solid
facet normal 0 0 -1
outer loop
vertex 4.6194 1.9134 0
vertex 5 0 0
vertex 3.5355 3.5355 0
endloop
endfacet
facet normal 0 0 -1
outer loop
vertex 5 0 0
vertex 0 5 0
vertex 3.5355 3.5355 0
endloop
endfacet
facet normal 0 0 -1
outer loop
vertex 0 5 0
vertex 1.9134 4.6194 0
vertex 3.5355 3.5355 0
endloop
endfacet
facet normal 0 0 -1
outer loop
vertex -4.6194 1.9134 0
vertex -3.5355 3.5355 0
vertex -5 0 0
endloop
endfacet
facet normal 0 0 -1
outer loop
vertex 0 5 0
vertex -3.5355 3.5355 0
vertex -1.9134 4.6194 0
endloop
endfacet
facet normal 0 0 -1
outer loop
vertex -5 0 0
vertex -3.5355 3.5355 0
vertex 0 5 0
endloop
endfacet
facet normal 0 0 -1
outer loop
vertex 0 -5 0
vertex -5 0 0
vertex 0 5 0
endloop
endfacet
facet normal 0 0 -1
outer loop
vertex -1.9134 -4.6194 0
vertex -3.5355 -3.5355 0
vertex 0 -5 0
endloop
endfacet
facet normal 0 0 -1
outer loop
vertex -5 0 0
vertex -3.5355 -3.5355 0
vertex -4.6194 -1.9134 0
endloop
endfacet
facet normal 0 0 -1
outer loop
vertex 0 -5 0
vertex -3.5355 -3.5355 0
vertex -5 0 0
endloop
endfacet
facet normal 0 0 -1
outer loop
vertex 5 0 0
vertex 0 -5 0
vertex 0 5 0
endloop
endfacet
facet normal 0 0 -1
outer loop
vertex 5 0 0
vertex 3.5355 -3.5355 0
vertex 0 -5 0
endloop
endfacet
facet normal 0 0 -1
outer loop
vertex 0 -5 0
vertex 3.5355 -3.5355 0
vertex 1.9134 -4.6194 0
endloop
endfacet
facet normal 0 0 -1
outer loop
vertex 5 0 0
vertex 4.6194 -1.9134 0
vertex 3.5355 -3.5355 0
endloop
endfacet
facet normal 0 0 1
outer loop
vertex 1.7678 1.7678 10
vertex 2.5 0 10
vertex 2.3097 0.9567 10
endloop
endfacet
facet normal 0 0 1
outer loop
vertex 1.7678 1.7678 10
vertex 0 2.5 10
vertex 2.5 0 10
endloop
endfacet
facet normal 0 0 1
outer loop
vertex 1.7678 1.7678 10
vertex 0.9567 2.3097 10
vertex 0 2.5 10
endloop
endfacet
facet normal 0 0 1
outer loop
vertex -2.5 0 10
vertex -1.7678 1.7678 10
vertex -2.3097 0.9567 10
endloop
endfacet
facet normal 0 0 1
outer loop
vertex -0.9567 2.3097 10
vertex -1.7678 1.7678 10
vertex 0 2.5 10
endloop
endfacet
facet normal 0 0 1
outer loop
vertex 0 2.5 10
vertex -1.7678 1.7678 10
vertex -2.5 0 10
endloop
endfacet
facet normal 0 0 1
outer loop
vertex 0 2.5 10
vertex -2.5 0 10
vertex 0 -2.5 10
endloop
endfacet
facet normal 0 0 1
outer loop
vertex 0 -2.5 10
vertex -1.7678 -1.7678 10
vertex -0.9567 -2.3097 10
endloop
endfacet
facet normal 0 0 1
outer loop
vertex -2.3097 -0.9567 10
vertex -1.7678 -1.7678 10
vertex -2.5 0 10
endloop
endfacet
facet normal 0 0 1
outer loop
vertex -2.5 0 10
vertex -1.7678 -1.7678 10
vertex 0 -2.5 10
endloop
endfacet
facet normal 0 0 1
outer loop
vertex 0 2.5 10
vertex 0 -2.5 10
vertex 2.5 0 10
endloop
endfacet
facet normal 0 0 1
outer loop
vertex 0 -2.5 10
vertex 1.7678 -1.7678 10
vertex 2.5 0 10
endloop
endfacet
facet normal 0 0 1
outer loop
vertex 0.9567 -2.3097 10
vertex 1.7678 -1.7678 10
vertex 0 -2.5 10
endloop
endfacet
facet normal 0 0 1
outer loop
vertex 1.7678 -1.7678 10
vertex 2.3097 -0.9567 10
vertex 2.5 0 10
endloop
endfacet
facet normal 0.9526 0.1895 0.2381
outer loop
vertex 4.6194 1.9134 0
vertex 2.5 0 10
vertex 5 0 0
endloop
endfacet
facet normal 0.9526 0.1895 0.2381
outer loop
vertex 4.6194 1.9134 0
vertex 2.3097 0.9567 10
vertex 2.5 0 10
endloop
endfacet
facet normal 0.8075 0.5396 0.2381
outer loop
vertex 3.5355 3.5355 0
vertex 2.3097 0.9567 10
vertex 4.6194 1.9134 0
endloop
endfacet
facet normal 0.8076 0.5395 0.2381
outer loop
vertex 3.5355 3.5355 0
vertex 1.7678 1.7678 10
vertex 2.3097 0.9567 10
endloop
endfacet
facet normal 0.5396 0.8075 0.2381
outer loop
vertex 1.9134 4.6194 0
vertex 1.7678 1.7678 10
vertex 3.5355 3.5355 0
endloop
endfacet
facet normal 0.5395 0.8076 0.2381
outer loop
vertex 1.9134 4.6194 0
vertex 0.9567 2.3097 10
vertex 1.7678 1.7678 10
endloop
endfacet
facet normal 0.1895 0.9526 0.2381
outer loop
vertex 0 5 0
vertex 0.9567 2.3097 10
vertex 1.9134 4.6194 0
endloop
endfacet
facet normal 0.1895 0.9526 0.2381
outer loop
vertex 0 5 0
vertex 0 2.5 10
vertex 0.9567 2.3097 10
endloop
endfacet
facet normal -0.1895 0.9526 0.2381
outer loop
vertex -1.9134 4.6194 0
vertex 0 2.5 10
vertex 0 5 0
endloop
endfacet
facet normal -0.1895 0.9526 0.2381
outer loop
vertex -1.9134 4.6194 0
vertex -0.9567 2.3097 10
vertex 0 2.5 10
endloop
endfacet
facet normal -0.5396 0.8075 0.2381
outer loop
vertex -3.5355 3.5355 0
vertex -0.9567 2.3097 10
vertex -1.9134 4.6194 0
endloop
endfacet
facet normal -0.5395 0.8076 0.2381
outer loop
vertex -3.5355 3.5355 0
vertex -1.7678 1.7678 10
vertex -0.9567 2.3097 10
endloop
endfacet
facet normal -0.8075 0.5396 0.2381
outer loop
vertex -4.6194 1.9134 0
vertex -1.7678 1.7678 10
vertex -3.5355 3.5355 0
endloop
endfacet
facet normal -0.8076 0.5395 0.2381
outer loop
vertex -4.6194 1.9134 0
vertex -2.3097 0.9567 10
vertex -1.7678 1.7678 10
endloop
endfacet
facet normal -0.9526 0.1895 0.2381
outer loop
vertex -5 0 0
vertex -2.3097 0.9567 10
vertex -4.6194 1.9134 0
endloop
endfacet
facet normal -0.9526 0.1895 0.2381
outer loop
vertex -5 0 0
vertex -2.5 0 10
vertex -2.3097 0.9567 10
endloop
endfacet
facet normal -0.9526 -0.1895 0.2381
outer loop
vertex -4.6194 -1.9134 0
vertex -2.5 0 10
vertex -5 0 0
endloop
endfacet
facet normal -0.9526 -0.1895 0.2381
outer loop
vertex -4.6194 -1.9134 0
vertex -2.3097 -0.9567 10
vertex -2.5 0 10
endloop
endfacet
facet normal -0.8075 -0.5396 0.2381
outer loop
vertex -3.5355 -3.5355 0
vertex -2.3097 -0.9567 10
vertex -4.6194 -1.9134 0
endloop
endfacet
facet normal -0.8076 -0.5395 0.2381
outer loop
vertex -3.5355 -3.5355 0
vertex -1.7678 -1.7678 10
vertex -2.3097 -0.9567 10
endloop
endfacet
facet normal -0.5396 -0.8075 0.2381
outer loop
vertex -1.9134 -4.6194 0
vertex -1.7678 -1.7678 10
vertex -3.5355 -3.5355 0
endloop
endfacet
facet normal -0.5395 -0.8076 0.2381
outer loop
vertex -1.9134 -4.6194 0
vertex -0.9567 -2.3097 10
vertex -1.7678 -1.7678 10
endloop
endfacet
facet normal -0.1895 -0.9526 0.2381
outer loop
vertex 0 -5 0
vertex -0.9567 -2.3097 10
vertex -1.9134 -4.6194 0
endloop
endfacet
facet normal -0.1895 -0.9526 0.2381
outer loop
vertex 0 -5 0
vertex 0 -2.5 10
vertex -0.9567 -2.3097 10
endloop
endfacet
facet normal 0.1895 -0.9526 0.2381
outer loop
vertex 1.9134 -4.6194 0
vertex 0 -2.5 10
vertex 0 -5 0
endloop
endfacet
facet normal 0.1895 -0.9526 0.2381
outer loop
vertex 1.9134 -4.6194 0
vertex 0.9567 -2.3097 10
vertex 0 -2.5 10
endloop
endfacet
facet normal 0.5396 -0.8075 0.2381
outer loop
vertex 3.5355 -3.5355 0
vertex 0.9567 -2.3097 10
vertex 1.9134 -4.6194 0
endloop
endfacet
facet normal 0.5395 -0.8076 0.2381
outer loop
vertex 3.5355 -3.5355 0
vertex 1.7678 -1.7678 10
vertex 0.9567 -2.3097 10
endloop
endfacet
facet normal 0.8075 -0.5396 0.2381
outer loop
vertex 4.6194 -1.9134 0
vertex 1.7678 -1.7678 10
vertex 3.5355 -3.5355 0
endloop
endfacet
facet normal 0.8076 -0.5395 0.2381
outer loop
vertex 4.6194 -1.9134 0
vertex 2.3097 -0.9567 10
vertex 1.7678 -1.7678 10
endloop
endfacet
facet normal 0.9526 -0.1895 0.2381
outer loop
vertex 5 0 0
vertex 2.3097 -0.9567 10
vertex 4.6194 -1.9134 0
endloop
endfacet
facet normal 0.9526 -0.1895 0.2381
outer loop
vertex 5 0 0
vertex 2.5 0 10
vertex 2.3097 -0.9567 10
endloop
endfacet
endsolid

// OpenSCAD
// Stage 2 of docs/audits/exact-geometry-rust.md: extrusions.
// A scaled extrusion of a centred circle: a cone frustum.
// volume: 458.14892864851146
linear_extrude(10, scale=0.5) circle(5);
